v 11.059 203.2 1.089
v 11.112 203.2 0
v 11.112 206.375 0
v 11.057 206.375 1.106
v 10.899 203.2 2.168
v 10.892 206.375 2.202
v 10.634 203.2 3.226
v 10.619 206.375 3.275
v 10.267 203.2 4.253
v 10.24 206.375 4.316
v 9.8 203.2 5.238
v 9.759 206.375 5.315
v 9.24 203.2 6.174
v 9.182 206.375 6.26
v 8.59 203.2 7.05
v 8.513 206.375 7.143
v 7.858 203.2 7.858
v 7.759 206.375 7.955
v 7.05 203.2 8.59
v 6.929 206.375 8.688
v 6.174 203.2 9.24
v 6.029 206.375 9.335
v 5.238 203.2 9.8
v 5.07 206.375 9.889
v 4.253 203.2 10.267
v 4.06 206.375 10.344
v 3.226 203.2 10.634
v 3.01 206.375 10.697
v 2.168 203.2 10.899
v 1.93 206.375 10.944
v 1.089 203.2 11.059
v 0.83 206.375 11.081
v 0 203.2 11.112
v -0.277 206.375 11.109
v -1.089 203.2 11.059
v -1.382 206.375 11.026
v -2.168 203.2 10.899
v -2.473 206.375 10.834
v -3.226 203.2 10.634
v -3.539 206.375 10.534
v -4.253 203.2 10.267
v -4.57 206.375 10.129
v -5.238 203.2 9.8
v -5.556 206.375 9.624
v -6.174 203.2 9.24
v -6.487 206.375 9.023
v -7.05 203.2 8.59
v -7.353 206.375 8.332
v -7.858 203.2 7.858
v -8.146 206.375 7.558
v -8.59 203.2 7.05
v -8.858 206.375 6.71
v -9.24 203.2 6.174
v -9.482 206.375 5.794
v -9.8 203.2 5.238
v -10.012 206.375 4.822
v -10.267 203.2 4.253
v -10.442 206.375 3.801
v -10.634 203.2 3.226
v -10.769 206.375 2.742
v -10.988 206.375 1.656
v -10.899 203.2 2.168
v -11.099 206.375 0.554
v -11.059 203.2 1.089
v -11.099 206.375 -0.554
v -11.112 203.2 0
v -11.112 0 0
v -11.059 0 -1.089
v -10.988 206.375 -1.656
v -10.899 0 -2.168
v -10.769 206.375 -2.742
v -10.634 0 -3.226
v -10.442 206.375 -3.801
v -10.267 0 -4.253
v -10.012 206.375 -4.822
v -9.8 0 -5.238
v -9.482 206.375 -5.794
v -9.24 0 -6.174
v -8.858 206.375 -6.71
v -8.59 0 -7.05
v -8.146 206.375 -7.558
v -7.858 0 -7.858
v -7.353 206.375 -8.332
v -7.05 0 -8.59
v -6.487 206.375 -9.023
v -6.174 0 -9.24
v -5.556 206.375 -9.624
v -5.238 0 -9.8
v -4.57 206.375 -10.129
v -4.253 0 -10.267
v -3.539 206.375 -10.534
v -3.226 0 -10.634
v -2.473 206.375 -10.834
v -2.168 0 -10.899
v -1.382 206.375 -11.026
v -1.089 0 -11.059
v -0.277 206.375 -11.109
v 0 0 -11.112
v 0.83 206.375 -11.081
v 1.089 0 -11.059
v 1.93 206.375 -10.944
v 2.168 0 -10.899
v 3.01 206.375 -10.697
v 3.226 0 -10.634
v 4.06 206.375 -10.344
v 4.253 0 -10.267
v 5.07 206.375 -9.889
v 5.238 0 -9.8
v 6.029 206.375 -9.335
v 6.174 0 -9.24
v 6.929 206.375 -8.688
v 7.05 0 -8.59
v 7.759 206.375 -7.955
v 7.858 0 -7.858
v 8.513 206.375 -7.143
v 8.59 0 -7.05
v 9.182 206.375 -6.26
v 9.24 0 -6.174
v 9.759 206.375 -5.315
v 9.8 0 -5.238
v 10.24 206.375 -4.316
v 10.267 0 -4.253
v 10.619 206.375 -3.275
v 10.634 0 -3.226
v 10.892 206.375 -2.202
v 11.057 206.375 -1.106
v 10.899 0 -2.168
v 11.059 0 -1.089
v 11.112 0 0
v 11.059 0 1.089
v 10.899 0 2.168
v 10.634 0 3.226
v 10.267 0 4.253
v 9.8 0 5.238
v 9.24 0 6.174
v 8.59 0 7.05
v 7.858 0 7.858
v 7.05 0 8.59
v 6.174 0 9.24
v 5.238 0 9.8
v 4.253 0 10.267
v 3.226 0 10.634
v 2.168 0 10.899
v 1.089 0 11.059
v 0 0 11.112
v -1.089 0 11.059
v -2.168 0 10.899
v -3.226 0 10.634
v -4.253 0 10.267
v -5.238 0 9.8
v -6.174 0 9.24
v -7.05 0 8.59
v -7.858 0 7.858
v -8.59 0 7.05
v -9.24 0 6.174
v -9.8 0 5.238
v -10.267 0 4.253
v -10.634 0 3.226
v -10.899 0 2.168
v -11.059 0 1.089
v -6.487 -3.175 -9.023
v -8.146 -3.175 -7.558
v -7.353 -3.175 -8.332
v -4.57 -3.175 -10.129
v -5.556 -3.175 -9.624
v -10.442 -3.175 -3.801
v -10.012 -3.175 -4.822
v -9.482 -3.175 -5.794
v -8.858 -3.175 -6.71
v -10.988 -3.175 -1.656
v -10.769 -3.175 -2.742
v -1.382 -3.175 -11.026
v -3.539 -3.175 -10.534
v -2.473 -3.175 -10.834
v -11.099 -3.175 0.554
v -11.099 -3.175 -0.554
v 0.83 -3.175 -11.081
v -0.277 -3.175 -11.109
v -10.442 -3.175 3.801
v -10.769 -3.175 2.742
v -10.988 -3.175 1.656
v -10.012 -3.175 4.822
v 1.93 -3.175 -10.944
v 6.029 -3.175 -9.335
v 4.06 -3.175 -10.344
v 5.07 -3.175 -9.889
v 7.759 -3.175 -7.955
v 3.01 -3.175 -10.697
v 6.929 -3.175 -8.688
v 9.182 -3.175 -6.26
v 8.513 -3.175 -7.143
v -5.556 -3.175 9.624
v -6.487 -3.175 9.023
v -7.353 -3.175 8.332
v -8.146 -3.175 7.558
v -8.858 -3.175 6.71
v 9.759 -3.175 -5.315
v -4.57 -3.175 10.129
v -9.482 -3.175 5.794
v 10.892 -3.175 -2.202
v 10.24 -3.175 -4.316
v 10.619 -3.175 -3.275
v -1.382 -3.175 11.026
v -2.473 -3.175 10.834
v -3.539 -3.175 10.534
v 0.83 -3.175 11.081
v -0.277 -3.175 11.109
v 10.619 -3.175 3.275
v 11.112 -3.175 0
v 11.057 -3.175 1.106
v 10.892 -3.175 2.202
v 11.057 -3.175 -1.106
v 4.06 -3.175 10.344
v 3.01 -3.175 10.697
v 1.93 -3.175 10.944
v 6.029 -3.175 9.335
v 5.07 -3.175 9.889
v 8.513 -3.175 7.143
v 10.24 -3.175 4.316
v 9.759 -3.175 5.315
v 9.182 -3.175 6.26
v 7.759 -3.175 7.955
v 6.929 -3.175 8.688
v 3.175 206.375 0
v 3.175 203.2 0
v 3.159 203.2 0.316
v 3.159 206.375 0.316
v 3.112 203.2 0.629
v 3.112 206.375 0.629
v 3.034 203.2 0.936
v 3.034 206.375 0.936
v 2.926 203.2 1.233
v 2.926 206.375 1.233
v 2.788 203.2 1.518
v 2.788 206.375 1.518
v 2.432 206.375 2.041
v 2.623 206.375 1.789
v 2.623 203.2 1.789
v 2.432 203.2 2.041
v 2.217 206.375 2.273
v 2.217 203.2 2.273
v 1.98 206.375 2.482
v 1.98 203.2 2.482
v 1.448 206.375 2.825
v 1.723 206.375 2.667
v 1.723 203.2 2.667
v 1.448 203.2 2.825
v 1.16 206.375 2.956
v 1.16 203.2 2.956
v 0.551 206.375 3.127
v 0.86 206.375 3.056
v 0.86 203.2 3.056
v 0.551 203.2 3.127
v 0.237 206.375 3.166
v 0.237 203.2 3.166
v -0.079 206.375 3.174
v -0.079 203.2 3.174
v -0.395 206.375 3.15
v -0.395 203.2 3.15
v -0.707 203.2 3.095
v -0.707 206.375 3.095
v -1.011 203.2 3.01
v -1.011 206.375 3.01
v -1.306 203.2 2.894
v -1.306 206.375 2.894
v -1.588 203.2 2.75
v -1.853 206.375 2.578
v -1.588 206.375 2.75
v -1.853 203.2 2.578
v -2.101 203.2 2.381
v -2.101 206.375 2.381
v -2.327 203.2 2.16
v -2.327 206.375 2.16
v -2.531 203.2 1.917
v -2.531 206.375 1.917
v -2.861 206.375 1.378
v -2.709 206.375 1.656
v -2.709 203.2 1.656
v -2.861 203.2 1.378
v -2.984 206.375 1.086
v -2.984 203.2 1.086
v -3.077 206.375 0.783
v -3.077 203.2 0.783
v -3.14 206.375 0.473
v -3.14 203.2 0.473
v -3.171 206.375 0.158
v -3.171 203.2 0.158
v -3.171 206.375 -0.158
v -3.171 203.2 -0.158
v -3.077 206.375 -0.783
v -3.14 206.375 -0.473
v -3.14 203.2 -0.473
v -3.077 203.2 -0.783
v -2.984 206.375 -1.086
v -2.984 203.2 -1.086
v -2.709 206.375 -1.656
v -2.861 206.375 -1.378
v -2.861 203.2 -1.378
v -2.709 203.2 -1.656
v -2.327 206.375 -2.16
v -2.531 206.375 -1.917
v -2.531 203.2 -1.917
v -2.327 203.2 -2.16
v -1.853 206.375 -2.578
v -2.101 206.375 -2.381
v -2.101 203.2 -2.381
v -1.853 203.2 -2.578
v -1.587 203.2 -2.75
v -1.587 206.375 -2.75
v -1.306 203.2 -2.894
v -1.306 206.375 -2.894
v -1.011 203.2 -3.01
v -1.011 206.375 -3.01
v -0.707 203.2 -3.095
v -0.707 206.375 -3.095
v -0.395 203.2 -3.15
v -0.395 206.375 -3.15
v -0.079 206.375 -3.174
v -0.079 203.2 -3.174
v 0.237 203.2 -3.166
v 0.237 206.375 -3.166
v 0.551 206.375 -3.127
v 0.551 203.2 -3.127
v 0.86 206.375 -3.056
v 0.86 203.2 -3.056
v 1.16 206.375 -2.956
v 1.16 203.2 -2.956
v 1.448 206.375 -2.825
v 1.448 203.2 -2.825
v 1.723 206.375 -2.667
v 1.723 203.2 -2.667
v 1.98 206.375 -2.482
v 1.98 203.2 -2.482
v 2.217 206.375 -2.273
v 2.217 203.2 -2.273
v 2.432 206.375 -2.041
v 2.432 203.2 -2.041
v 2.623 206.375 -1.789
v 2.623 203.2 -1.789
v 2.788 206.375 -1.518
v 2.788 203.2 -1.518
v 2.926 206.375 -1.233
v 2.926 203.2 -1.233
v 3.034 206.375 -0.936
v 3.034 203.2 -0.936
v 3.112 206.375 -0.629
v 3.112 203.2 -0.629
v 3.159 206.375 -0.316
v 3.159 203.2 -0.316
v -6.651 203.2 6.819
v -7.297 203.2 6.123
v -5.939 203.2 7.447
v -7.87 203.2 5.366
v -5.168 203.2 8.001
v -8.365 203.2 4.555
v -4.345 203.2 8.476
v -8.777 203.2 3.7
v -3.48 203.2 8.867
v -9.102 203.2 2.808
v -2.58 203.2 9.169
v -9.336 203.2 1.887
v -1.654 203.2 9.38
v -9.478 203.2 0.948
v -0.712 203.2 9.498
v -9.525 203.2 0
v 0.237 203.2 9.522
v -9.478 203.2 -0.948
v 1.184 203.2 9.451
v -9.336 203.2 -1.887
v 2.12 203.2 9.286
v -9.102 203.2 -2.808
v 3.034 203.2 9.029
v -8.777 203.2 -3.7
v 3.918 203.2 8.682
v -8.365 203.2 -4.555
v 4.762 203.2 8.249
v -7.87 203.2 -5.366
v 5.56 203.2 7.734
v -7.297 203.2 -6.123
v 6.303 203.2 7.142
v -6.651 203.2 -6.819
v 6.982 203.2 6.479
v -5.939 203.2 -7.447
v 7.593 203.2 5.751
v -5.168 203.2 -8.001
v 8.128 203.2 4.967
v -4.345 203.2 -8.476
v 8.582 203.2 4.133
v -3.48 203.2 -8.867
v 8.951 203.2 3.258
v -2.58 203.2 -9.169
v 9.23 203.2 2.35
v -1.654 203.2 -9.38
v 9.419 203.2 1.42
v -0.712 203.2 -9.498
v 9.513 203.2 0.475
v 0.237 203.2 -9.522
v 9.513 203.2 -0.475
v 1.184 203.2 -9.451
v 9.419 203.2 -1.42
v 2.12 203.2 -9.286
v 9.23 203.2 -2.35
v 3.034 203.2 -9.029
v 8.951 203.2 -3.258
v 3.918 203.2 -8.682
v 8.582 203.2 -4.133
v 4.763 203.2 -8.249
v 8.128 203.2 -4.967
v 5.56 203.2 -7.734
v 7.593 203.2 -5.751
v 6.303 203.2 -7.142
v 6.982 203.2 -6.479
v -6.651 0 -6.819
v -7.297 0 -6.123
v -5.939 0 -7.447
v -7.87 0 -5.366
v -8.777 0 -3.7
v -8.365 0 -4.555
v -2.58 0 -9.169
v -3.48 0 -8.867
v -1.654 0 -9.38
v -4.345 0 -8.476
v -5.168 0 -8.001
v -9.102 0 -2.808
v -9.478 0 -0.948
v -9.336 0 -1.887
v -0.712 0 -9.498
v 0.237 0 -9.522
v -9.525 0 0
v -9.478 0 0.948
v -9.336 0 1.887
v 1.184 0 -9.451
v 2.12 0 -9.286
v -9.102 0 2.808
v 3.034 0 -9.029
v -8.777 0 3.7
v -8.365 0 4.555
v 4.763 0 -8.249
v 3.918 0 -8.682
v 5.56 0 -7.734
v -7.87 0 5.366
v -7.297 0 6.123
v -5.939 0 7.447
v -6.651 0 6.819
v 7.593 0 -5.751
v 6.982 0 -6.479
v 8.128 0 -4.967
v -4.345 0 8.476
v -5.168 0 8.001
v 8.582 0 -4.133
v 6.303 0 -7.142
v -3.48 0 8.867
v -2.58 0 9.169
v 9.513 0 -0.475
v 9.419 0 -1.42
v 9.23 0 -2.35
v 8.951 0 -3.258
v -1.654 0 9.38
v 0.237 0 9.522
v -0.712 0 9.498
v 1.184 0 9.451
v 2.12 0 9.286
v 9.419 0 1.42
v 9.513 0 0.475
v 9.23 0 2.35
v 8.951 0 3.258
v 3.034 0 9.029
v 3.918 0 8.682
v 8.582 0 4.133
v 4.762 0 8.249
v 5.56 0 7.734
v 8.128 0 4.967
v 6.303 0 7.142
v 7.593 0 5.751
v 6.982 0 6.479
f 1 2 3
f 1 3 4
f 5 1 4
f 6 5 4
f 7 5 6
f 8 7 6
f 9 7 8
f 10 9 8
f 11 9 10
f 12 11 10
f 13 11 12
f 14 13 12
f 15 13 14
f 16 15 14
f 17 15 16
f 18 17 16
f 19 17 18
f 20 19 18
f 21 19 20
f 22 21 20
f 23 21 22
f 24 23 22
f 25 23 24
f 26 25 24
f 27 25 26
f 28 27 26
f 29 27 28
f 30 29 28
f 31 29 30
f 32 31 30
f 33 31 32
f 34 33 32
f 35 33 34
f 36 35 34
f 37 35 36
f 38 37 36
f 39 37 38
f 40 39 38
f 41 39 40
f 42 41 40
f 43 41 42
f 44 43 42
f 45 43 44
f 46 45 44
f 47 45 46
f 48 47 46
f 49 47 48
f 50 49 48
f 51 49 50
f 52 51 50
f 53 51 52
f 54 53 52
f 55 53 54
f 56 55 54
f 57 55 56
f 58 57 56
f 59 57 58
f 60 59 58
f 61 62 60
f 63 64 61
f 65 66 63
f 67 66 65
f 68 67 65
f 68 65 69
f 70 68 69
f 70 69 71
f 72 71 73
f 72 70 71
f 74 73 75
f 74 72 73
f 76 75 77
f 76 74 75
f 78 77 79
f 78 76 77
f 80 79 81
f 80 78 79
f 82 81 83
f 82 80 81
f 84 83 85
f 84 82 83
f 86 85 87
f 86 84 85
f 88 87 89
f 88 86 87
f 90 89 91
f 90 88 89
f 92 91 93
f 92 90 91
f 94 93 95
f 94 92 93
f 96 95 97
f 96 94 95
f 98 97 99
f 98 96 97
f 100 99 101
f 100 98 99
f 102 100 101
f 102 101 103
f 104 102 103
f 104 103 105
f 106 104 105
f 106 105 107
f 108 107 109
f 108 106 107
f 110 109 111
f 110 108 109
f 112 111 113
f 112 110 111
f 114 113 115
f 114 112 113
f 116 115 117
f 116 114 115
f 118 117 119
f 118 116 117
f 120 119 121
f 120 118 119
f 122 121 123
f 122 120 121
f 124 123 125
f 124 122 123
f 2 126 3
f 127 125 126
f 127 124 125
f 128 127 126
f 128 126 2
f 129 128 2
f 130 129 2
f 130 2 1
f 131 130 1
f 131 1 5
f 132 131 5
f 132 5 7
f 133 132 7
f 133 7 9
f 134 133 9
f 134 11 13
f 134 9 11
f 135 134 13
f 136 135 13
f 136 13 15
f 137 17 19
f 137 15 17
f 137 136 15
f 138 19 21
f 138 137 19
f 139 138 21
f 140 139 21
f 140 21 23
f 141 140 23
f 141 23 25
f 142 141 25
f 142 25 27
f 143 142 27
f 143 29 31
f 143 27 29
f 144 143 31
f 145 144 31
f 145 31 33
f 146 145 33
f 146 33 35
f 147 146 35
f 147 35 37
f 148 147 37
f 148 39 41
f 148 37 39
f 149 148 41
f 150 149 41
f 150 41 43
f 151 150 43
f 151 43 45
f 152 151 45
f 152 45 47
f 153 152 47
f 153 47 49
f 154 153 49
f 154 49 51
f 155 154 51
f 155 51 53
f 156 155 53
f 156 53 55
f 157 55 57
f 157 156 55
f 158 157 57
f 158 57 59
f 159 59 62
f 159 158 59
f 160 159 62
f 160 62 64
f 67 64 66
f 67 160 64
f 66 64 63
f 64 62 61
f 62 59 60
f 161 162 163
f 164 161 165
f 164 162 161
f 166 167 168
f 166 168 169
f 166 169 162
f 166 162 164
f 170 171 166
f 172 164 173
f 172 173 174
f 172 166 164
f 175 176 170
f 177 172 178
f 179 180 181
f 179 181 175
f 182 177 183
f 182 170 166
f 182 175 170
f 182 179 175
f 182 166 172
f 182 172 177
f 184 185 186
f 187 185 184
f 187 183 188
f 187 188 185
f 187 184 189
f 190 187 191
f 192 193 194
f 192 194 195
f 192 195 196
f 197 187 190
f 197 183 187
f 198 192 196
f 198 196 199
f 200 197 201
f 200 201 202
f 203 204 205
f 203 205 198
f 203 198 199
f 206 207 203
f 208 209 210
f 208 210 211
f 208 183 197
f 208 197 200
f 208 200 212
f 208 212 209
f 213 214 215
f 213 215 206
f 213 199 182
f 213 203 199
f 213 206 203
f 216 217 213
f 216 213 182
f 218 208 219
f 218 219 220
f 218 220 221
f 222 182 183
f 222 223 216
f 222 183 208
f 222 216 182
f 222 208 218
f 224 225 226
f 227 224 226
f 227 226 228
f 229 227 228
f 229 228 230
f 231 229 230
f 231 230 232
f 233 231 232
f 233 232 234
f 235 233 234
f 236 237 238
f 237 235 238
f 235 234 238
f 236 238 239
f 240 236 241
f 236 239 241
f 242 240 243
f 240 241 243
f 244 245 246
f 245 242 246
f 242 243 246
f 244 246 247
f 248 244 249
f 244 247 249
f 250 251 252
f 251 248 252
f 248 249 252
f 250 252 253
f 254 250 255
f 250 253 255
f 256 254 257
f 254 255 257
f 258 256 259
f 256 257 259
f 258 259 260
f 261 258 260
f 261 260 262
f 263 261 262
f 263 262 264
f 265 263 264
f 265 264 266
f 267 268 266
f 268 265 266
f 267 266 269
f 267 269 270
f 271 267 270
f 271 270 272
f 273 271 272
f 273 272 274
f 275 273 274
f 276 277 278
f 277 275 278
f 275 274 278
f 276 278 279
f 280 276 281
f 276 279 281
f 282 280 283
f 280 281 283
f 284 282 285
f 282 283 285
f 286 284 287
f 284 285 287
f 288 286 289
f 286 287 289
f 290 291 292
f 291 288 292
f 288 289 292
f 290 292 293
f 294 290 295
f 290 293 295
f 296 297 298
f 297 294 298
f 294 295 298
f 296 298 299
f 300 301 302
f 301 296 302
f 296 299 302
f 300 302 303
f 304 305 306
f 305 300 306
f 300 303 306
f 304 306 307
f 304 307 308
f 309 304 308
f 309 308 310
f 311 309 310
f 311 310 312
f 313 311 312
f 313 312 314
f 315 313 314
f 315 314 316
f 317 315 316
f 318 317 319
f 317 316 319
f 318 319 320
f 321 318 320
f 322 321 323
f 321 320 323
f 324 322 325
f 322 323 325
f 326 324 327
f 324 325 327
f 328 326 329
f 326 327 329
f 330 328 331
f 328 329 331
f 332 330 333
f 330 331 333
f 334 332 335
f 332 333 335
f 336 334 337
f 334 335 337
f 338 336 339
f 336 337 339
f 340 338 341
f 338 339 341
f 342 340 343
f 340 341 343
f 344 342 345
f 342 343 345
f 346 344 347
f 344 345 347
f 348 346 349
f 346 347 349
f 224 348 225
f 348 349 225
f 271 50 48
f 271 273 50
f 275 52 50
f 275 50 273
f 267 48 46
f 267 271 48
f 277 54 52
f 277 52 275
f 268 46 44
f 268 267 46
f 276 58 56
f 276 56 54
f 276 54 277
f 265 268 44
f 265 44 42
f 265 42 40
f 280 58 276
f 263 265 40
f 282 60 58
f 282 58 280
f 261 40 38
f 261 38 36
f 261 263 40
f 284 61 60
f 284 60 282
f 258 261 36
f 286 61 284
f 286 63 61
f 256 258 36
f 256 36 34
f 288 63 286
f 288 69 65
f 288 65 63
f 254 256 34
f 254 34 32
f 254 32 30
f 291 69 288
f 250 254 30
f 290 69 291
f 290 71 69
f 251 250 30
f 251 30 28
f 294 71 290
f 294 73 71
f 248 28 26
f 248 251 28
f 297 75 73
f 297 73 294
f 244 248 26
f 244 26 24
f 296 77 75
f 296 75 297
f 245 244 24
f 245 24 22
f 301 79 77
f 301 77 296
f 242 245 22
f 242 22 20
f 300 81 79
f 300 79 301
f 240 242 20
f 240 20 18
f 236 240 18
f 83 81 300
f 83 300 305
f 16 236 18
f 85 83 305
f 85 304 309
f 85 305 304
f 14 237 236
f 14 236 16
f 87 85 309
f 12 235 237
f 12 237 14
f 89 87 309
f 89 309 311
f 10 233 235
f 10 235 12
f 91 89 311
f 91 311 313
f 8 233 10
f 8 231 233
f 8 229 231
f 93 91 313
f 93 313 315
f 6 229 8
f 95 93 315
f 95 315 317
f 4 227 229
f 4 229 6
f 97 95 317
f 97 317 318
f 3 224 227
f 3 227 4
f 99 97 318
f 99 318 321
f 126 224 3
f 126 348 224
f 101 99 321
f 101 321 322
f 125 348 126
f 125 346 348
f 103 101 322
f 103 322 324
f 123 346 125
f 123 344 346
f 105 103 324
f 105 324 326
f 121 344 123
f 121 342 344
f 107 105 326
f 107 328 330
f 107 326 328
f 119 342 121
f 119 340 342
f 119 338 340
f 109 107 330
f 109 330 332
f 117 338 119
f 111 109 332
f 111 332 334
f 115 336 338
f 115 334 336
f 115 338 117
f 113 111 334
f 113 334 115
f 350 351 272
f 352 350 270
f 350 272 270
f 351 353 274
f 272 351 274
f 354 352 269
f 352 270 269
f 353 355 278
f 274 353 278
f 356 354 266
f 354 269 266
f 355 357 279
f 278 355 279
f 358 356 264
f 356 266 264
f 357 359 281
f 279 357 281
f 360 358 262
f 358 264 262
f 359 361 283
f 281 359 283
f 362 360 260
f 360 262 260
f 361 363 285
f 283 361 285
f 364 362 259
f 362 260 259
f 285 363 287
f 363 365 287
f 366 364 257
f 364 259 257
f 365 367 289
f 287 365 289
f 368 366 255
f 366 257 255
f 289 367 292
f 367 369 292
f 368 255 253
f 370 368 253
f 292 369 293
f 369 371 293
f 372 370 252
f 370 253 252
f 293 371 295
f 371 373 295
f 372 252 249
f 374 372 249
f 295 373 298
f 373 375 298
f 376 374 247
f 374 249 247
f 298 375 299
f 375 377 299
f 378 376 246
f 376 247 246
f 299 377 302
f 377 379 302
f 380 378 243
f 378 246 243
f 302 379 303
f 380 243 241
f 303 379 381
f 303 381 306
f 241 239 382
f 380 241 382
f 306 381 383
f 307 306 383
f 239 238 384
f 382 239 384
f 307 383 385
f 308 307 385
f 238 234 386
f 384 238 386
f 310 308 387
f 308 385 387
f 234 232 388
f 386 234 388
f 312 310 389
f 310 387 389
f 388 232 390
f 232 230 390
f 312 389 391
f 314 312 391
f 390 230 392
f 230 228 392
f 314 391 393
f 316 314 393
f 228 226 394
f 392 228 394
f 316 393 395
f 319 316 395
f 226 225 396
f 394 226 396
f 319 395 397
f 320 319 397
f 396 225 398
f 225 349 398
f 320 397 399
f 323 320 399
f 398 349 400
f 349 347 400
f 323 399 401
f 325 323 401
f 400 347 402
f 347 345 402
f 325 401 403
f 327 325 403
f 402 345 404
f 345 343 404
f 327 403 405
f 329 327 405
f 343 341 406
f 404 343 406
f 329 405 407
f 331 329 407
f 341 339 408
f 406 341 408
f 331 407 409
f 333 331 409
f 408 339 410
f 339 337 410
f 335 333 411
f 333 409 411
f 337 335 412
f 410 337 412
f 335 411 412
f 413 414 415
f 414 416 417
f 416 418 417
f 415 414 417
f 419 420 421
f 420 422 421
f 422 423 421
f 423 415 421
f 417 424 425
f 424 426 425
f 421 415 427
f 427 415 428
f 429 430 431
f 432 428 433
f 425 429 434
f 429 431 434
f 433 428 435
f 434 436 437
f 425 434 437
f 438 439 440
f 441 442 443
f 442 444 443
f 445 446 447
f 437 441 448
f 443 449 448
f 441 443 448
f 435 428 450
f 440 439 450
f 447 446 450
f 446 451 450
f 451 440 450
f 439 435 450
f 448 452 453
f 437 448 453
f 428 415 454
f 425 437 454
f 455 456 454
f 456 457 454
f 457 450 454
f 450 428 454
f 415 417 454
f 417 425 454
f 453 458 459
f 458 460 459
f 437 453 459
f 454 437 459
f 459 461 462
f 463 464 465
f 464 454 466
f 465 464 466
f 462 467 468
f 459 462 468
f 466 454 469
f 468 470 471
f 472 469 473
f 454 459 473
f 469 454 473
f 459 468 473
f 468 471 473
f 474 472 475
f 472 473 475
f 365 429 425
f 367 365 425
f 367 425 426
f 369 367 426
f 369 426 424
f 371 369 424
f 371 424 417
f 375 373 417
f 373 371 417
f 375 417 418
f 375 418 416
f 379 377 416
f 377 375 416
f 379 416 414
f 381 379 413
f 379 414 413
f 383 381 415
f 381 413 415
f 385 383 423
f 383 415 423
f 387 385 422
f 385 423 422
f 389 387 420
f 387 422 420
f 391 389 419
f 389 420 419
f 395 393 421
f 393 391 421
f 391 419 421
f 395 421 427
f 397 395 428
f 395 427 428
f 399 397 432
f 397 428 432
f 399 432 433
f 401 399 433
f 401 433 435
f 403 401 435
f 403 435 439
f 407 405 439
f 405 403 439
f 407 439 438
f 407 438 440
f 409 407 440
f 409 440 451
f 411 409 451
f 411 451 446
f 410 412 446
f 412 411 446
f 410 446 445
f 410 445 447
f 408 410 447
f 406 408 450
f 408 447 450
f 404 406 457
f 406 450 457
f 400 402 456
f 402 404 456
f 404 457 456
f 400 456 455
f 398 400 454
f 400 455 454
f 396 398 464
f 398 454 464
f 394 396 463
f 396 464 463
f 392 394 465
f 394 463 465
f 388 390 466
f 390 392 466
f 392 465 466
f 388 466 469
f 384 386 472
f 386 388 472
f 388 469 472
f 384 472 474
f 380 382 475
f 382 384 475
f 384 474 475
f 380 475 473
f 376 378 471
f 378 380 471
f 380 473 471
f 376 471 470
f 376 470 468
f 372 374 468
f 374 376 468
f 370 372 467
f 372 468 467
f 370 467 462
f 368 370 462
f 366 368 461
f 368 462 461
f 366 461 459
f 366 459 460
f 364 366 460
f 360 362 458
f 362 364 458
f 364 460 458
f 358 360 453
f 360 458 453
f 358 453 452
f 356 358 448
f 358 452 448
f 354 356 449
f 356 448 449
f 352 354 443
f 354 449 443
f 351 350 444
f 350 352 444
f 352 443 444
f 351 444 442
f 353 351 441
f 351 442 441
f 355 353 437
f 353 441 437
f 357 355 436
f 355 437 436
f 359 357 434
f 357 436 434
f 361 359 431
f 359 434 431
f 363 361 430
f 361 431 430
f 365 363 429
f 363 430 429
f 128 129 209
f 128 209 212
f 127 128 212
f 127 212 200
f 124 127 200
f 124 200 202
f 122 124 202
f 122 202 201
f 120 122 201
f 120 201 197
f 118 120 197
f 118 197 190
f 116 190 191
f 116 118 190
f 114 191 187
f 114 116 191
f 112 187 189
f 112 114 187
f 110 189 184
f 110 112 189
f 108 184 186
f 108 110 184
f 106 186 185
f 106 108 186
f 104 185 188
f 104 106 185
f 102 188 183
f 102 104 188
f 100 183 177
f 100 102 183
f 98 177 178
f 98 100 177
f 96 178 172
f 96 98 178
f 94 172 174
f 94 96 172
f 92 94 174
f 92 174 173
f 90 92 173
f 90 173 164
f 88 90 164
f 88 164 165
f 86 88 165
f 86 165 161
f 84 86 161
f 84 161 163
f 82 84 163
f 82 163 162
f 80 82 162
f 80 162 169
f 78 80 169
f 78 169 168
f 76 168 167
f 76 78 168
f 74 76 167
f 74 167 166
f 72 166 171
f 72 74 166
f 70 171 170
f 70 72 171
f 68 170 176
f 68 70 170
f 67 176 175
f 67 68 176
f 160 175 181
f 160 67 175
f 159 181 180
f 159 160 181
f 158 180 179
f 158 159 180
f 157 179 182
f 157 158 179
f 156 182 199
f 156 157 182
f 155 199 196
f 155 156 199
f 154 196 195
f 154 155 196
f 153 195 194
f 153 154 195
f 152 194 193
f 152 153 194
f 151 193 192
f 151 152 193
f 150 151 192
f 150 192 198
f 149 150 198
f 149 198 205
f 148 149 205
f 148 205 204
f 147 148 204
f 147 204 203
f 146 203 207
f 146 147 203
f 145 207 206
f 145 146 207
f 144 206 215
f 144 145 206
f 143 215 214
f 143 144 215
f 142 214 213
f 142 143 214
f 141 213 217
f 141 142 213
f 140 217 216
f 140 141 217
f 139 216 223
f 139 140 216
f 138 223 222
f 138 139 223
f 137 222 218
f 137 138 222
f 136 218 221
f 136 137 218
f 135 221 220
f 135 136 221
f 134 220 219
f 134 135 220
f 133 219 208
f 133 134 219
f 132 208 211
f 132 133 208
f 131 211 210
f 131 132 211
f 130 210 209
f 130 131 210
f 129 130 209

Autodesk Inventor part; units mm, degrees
ref_plane "YZ Plane" through (0, 0, 0) normal (1, 0, 0) x (0, 1, 0)
ref_plane "XZ Plane" through (0, 0, 0) normal (0, 1, 0) x (-1, 0, 0)
ref_plane "XY Plane" through (0, 0, 0) normal (0, 0, 1) x (1, 0, 0)
sketch "Sketch1" plane through (0, 0, 0) normal (0, 1, 0) x (-1, 0, 0)
  circle A0 centre (0, 0) radius 11.1125
  circle A1 centre (0, 0) radius 9.525
  dimension "d0" = 22.225
  dimension "d1" = 19.05
extrude "Extrusion1" add sketch "Sketch1" along normal blind 203.2
sketch "Sketch2" plane through (0, 203.2, 0) normal (0, 1, 0) x (1, 0, 0)
  circle A0 centre (0, 0) radius 11.1125
  circle A1 centre (0, 0) radius 3.175
  dimension "d4" = 6.35
extrude "Extrusion2" add sketch "Sketch2" along normal blind 3.175
sketch "Sketch3" plane through (0, 0, 0) normal (0, -1, 0) x (1, 0, 0)
  circle A0 centre (0, 0) radius 11.1125 projected
extrude "Extrusion3" add sketch "Sketch3" along normal blind 3.175
properties part number "Cylinder"
